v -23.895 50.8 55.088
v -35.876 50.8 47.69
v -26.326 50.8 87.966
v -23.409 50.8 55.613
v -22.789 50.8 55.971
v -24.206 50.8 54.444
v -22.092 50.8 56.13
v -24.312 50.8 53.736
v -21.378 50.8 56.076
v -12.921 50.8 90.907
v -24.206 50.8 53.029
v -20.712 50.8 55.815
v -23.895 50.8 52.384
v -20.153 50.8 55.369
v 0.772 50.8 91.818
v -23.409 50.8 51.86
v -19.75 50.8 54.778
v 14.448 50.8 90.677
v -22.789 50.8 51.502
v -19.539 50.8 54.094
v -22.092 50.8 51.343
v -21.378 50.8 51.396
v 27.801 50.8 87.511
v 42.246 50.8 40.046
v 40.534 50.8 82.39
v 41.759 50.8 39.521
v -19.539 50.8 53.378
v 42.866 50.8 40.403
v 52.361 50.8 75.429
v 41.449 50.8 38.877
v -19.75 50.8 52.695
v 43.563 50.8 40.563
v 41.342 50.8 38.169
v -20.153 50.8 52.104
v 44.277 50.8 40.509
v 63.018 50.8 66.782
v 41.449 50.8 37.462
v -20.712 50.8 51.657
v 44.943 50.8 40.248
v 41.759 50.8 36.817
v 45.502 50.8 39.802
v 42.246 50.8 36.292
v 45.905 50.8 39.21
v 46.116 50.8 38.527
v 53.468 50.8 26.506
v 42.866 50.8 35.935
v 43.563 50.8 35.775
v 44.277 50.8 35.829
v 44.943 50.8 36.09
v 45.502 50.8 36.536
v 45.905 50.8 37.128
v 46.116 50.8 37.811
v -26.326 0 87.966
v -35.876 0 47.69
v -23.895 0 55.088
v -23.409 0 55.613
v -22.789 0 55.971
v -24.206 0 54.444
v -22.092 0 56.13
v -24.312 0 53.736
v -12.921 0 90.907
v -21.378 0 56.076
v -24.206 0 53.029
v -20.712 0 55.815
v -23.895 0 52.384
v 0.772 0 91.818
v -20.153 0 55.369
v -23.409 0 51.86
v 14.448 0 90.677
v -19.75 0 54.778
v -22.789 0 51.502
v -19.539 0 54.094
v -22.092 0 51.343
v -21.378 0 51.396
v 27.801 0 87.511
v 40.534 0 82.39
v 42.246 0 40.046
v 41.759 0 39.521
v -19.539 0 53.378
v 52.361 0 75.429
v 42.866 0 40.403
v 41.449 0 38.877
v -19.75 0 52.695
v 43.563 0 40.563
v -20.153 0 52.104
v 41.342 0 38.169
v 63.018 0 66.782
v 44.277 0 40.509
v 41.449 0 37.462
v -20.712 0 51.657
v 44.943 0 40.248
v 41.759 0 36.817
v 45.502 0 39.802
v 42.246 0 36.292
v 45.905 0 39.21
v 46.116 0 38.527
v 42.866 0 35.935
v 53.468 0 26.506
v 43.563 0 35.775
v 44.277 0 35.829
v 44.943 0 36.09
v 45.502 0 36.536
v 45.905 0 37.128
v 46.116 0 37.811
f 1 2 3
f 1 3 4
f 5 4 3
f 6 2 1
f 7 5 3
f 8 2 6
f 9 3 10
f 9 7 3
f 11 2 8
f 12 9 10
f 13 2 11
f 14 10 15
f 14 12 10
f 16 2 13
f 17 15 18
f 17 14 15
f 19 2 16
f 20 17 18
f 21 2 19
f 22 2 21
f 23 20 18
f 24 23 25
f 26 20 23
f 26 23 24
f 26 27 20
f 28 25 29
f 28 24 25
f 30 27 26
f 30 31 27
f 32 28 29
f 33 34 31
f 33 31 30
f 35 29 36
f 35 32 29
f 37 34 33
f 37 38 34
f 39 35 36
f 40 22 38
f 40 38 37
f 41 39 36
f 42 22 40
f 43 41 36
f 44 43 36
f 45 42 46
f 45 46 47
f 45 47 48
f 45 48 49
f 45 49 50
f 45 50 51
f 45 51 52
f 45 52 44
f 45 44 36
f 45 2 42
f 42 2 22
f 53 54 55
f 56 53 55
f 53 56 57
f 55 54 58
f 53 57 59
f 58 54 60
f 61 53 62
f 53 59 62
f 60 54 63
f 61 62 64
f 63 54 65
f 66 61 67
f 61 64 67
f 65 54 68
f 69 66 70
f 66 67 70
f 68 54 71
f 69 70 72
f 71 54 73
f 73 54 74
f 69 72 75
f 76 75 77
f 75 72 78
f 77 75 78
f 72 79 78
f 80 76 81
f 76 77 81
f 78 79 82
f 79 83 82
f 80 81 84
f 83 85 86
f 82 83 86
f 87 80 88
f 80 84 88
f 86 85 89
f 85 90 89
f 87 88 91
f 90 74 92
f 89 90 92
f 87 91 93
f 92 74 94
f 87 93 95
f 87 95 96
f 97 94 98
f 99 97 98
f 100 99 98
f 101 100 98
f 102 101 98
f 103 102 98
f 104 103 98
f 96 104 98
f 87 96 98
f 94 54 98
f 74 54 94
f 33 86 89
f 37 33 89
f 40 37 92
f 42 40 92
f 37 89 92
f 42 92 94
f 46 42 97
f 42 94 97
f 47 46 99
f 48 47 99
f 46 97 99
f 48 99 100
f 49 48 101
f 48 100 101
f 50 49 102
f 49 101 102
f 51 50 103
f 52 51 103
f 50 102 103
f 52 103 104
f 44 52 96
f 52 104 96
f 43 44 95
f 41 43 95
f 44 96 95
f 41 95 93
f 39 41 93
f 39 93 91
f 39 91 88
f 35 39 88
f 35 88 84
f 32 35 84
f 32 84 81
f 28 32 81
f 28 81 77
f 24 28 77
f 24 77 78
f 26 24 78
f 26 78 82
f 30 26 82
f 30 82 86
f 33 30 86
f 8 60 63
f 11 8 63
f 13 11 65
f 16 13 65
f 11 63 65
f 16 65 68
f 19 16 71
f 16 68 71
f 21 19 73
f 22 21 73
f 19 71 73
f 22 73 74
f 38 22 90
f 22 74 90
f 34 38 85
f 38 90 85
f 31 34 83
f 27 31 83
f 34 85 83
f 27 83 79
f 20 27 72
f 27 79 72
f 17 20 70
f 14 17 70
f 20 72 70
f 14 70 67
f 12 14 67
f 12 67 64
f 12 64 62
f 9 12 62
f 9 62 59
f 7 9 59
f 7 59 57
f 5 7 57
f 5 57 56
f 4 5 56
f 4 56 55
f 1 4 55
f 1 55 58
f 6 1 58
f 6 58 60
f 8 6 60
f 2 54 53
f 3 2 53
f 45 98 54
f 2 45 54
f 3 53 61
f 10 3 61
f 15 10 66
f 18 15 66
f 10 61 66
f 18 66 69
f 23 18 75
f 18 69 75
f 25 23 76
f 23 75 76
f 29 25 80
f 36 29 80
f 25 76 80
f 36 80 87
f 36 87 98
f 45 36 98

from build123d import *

# Parameters (mm, degrees)
BOSS_EXTRUDE1_DEPTH         = 50.8
F_12_0_189_DIAMETER_HOLE1_D = 4.8006


with BuildPart() as part:
    # Sketch1 → Boss-Extrude1 (new body)
    with BuildSketch(Plane(origin=(0, 0, 0), x_dir=(1, 0, 0), z_dir=(0, 1, 0))):
        with BuildLine():
            Line((63.017839503, -66.782093), (53.468205472, -26.506342671))
            Line((53.468205472, -26.506342671), (-35.875703335, -47.690346072))
            Line((-35.875703335, -47.690346072), (-26.326069304, -87.966096401))
            ThreePointArc((-26.326069304, -87.966096401), (21.184003401, -89.343908807), (63.017839503, -66.782093))
        make_face()
    extrude(amount=BOSS_EXTRUDE1_DEPTH)

    # #12 (0.189) Diameter Hole1 (through all)
    with Locations(Plane(origin=(0, 50.8, 0), x_dir=(1, 0, 0), z_dir=(0, 1, 0))):
        with Locations((-21.91216983, -53.736183096), (43.742627992, -38.169017556)):
            Hole(F_12_0_189_DIAMETER_HOLE1_D / 2)


solid = part.part
